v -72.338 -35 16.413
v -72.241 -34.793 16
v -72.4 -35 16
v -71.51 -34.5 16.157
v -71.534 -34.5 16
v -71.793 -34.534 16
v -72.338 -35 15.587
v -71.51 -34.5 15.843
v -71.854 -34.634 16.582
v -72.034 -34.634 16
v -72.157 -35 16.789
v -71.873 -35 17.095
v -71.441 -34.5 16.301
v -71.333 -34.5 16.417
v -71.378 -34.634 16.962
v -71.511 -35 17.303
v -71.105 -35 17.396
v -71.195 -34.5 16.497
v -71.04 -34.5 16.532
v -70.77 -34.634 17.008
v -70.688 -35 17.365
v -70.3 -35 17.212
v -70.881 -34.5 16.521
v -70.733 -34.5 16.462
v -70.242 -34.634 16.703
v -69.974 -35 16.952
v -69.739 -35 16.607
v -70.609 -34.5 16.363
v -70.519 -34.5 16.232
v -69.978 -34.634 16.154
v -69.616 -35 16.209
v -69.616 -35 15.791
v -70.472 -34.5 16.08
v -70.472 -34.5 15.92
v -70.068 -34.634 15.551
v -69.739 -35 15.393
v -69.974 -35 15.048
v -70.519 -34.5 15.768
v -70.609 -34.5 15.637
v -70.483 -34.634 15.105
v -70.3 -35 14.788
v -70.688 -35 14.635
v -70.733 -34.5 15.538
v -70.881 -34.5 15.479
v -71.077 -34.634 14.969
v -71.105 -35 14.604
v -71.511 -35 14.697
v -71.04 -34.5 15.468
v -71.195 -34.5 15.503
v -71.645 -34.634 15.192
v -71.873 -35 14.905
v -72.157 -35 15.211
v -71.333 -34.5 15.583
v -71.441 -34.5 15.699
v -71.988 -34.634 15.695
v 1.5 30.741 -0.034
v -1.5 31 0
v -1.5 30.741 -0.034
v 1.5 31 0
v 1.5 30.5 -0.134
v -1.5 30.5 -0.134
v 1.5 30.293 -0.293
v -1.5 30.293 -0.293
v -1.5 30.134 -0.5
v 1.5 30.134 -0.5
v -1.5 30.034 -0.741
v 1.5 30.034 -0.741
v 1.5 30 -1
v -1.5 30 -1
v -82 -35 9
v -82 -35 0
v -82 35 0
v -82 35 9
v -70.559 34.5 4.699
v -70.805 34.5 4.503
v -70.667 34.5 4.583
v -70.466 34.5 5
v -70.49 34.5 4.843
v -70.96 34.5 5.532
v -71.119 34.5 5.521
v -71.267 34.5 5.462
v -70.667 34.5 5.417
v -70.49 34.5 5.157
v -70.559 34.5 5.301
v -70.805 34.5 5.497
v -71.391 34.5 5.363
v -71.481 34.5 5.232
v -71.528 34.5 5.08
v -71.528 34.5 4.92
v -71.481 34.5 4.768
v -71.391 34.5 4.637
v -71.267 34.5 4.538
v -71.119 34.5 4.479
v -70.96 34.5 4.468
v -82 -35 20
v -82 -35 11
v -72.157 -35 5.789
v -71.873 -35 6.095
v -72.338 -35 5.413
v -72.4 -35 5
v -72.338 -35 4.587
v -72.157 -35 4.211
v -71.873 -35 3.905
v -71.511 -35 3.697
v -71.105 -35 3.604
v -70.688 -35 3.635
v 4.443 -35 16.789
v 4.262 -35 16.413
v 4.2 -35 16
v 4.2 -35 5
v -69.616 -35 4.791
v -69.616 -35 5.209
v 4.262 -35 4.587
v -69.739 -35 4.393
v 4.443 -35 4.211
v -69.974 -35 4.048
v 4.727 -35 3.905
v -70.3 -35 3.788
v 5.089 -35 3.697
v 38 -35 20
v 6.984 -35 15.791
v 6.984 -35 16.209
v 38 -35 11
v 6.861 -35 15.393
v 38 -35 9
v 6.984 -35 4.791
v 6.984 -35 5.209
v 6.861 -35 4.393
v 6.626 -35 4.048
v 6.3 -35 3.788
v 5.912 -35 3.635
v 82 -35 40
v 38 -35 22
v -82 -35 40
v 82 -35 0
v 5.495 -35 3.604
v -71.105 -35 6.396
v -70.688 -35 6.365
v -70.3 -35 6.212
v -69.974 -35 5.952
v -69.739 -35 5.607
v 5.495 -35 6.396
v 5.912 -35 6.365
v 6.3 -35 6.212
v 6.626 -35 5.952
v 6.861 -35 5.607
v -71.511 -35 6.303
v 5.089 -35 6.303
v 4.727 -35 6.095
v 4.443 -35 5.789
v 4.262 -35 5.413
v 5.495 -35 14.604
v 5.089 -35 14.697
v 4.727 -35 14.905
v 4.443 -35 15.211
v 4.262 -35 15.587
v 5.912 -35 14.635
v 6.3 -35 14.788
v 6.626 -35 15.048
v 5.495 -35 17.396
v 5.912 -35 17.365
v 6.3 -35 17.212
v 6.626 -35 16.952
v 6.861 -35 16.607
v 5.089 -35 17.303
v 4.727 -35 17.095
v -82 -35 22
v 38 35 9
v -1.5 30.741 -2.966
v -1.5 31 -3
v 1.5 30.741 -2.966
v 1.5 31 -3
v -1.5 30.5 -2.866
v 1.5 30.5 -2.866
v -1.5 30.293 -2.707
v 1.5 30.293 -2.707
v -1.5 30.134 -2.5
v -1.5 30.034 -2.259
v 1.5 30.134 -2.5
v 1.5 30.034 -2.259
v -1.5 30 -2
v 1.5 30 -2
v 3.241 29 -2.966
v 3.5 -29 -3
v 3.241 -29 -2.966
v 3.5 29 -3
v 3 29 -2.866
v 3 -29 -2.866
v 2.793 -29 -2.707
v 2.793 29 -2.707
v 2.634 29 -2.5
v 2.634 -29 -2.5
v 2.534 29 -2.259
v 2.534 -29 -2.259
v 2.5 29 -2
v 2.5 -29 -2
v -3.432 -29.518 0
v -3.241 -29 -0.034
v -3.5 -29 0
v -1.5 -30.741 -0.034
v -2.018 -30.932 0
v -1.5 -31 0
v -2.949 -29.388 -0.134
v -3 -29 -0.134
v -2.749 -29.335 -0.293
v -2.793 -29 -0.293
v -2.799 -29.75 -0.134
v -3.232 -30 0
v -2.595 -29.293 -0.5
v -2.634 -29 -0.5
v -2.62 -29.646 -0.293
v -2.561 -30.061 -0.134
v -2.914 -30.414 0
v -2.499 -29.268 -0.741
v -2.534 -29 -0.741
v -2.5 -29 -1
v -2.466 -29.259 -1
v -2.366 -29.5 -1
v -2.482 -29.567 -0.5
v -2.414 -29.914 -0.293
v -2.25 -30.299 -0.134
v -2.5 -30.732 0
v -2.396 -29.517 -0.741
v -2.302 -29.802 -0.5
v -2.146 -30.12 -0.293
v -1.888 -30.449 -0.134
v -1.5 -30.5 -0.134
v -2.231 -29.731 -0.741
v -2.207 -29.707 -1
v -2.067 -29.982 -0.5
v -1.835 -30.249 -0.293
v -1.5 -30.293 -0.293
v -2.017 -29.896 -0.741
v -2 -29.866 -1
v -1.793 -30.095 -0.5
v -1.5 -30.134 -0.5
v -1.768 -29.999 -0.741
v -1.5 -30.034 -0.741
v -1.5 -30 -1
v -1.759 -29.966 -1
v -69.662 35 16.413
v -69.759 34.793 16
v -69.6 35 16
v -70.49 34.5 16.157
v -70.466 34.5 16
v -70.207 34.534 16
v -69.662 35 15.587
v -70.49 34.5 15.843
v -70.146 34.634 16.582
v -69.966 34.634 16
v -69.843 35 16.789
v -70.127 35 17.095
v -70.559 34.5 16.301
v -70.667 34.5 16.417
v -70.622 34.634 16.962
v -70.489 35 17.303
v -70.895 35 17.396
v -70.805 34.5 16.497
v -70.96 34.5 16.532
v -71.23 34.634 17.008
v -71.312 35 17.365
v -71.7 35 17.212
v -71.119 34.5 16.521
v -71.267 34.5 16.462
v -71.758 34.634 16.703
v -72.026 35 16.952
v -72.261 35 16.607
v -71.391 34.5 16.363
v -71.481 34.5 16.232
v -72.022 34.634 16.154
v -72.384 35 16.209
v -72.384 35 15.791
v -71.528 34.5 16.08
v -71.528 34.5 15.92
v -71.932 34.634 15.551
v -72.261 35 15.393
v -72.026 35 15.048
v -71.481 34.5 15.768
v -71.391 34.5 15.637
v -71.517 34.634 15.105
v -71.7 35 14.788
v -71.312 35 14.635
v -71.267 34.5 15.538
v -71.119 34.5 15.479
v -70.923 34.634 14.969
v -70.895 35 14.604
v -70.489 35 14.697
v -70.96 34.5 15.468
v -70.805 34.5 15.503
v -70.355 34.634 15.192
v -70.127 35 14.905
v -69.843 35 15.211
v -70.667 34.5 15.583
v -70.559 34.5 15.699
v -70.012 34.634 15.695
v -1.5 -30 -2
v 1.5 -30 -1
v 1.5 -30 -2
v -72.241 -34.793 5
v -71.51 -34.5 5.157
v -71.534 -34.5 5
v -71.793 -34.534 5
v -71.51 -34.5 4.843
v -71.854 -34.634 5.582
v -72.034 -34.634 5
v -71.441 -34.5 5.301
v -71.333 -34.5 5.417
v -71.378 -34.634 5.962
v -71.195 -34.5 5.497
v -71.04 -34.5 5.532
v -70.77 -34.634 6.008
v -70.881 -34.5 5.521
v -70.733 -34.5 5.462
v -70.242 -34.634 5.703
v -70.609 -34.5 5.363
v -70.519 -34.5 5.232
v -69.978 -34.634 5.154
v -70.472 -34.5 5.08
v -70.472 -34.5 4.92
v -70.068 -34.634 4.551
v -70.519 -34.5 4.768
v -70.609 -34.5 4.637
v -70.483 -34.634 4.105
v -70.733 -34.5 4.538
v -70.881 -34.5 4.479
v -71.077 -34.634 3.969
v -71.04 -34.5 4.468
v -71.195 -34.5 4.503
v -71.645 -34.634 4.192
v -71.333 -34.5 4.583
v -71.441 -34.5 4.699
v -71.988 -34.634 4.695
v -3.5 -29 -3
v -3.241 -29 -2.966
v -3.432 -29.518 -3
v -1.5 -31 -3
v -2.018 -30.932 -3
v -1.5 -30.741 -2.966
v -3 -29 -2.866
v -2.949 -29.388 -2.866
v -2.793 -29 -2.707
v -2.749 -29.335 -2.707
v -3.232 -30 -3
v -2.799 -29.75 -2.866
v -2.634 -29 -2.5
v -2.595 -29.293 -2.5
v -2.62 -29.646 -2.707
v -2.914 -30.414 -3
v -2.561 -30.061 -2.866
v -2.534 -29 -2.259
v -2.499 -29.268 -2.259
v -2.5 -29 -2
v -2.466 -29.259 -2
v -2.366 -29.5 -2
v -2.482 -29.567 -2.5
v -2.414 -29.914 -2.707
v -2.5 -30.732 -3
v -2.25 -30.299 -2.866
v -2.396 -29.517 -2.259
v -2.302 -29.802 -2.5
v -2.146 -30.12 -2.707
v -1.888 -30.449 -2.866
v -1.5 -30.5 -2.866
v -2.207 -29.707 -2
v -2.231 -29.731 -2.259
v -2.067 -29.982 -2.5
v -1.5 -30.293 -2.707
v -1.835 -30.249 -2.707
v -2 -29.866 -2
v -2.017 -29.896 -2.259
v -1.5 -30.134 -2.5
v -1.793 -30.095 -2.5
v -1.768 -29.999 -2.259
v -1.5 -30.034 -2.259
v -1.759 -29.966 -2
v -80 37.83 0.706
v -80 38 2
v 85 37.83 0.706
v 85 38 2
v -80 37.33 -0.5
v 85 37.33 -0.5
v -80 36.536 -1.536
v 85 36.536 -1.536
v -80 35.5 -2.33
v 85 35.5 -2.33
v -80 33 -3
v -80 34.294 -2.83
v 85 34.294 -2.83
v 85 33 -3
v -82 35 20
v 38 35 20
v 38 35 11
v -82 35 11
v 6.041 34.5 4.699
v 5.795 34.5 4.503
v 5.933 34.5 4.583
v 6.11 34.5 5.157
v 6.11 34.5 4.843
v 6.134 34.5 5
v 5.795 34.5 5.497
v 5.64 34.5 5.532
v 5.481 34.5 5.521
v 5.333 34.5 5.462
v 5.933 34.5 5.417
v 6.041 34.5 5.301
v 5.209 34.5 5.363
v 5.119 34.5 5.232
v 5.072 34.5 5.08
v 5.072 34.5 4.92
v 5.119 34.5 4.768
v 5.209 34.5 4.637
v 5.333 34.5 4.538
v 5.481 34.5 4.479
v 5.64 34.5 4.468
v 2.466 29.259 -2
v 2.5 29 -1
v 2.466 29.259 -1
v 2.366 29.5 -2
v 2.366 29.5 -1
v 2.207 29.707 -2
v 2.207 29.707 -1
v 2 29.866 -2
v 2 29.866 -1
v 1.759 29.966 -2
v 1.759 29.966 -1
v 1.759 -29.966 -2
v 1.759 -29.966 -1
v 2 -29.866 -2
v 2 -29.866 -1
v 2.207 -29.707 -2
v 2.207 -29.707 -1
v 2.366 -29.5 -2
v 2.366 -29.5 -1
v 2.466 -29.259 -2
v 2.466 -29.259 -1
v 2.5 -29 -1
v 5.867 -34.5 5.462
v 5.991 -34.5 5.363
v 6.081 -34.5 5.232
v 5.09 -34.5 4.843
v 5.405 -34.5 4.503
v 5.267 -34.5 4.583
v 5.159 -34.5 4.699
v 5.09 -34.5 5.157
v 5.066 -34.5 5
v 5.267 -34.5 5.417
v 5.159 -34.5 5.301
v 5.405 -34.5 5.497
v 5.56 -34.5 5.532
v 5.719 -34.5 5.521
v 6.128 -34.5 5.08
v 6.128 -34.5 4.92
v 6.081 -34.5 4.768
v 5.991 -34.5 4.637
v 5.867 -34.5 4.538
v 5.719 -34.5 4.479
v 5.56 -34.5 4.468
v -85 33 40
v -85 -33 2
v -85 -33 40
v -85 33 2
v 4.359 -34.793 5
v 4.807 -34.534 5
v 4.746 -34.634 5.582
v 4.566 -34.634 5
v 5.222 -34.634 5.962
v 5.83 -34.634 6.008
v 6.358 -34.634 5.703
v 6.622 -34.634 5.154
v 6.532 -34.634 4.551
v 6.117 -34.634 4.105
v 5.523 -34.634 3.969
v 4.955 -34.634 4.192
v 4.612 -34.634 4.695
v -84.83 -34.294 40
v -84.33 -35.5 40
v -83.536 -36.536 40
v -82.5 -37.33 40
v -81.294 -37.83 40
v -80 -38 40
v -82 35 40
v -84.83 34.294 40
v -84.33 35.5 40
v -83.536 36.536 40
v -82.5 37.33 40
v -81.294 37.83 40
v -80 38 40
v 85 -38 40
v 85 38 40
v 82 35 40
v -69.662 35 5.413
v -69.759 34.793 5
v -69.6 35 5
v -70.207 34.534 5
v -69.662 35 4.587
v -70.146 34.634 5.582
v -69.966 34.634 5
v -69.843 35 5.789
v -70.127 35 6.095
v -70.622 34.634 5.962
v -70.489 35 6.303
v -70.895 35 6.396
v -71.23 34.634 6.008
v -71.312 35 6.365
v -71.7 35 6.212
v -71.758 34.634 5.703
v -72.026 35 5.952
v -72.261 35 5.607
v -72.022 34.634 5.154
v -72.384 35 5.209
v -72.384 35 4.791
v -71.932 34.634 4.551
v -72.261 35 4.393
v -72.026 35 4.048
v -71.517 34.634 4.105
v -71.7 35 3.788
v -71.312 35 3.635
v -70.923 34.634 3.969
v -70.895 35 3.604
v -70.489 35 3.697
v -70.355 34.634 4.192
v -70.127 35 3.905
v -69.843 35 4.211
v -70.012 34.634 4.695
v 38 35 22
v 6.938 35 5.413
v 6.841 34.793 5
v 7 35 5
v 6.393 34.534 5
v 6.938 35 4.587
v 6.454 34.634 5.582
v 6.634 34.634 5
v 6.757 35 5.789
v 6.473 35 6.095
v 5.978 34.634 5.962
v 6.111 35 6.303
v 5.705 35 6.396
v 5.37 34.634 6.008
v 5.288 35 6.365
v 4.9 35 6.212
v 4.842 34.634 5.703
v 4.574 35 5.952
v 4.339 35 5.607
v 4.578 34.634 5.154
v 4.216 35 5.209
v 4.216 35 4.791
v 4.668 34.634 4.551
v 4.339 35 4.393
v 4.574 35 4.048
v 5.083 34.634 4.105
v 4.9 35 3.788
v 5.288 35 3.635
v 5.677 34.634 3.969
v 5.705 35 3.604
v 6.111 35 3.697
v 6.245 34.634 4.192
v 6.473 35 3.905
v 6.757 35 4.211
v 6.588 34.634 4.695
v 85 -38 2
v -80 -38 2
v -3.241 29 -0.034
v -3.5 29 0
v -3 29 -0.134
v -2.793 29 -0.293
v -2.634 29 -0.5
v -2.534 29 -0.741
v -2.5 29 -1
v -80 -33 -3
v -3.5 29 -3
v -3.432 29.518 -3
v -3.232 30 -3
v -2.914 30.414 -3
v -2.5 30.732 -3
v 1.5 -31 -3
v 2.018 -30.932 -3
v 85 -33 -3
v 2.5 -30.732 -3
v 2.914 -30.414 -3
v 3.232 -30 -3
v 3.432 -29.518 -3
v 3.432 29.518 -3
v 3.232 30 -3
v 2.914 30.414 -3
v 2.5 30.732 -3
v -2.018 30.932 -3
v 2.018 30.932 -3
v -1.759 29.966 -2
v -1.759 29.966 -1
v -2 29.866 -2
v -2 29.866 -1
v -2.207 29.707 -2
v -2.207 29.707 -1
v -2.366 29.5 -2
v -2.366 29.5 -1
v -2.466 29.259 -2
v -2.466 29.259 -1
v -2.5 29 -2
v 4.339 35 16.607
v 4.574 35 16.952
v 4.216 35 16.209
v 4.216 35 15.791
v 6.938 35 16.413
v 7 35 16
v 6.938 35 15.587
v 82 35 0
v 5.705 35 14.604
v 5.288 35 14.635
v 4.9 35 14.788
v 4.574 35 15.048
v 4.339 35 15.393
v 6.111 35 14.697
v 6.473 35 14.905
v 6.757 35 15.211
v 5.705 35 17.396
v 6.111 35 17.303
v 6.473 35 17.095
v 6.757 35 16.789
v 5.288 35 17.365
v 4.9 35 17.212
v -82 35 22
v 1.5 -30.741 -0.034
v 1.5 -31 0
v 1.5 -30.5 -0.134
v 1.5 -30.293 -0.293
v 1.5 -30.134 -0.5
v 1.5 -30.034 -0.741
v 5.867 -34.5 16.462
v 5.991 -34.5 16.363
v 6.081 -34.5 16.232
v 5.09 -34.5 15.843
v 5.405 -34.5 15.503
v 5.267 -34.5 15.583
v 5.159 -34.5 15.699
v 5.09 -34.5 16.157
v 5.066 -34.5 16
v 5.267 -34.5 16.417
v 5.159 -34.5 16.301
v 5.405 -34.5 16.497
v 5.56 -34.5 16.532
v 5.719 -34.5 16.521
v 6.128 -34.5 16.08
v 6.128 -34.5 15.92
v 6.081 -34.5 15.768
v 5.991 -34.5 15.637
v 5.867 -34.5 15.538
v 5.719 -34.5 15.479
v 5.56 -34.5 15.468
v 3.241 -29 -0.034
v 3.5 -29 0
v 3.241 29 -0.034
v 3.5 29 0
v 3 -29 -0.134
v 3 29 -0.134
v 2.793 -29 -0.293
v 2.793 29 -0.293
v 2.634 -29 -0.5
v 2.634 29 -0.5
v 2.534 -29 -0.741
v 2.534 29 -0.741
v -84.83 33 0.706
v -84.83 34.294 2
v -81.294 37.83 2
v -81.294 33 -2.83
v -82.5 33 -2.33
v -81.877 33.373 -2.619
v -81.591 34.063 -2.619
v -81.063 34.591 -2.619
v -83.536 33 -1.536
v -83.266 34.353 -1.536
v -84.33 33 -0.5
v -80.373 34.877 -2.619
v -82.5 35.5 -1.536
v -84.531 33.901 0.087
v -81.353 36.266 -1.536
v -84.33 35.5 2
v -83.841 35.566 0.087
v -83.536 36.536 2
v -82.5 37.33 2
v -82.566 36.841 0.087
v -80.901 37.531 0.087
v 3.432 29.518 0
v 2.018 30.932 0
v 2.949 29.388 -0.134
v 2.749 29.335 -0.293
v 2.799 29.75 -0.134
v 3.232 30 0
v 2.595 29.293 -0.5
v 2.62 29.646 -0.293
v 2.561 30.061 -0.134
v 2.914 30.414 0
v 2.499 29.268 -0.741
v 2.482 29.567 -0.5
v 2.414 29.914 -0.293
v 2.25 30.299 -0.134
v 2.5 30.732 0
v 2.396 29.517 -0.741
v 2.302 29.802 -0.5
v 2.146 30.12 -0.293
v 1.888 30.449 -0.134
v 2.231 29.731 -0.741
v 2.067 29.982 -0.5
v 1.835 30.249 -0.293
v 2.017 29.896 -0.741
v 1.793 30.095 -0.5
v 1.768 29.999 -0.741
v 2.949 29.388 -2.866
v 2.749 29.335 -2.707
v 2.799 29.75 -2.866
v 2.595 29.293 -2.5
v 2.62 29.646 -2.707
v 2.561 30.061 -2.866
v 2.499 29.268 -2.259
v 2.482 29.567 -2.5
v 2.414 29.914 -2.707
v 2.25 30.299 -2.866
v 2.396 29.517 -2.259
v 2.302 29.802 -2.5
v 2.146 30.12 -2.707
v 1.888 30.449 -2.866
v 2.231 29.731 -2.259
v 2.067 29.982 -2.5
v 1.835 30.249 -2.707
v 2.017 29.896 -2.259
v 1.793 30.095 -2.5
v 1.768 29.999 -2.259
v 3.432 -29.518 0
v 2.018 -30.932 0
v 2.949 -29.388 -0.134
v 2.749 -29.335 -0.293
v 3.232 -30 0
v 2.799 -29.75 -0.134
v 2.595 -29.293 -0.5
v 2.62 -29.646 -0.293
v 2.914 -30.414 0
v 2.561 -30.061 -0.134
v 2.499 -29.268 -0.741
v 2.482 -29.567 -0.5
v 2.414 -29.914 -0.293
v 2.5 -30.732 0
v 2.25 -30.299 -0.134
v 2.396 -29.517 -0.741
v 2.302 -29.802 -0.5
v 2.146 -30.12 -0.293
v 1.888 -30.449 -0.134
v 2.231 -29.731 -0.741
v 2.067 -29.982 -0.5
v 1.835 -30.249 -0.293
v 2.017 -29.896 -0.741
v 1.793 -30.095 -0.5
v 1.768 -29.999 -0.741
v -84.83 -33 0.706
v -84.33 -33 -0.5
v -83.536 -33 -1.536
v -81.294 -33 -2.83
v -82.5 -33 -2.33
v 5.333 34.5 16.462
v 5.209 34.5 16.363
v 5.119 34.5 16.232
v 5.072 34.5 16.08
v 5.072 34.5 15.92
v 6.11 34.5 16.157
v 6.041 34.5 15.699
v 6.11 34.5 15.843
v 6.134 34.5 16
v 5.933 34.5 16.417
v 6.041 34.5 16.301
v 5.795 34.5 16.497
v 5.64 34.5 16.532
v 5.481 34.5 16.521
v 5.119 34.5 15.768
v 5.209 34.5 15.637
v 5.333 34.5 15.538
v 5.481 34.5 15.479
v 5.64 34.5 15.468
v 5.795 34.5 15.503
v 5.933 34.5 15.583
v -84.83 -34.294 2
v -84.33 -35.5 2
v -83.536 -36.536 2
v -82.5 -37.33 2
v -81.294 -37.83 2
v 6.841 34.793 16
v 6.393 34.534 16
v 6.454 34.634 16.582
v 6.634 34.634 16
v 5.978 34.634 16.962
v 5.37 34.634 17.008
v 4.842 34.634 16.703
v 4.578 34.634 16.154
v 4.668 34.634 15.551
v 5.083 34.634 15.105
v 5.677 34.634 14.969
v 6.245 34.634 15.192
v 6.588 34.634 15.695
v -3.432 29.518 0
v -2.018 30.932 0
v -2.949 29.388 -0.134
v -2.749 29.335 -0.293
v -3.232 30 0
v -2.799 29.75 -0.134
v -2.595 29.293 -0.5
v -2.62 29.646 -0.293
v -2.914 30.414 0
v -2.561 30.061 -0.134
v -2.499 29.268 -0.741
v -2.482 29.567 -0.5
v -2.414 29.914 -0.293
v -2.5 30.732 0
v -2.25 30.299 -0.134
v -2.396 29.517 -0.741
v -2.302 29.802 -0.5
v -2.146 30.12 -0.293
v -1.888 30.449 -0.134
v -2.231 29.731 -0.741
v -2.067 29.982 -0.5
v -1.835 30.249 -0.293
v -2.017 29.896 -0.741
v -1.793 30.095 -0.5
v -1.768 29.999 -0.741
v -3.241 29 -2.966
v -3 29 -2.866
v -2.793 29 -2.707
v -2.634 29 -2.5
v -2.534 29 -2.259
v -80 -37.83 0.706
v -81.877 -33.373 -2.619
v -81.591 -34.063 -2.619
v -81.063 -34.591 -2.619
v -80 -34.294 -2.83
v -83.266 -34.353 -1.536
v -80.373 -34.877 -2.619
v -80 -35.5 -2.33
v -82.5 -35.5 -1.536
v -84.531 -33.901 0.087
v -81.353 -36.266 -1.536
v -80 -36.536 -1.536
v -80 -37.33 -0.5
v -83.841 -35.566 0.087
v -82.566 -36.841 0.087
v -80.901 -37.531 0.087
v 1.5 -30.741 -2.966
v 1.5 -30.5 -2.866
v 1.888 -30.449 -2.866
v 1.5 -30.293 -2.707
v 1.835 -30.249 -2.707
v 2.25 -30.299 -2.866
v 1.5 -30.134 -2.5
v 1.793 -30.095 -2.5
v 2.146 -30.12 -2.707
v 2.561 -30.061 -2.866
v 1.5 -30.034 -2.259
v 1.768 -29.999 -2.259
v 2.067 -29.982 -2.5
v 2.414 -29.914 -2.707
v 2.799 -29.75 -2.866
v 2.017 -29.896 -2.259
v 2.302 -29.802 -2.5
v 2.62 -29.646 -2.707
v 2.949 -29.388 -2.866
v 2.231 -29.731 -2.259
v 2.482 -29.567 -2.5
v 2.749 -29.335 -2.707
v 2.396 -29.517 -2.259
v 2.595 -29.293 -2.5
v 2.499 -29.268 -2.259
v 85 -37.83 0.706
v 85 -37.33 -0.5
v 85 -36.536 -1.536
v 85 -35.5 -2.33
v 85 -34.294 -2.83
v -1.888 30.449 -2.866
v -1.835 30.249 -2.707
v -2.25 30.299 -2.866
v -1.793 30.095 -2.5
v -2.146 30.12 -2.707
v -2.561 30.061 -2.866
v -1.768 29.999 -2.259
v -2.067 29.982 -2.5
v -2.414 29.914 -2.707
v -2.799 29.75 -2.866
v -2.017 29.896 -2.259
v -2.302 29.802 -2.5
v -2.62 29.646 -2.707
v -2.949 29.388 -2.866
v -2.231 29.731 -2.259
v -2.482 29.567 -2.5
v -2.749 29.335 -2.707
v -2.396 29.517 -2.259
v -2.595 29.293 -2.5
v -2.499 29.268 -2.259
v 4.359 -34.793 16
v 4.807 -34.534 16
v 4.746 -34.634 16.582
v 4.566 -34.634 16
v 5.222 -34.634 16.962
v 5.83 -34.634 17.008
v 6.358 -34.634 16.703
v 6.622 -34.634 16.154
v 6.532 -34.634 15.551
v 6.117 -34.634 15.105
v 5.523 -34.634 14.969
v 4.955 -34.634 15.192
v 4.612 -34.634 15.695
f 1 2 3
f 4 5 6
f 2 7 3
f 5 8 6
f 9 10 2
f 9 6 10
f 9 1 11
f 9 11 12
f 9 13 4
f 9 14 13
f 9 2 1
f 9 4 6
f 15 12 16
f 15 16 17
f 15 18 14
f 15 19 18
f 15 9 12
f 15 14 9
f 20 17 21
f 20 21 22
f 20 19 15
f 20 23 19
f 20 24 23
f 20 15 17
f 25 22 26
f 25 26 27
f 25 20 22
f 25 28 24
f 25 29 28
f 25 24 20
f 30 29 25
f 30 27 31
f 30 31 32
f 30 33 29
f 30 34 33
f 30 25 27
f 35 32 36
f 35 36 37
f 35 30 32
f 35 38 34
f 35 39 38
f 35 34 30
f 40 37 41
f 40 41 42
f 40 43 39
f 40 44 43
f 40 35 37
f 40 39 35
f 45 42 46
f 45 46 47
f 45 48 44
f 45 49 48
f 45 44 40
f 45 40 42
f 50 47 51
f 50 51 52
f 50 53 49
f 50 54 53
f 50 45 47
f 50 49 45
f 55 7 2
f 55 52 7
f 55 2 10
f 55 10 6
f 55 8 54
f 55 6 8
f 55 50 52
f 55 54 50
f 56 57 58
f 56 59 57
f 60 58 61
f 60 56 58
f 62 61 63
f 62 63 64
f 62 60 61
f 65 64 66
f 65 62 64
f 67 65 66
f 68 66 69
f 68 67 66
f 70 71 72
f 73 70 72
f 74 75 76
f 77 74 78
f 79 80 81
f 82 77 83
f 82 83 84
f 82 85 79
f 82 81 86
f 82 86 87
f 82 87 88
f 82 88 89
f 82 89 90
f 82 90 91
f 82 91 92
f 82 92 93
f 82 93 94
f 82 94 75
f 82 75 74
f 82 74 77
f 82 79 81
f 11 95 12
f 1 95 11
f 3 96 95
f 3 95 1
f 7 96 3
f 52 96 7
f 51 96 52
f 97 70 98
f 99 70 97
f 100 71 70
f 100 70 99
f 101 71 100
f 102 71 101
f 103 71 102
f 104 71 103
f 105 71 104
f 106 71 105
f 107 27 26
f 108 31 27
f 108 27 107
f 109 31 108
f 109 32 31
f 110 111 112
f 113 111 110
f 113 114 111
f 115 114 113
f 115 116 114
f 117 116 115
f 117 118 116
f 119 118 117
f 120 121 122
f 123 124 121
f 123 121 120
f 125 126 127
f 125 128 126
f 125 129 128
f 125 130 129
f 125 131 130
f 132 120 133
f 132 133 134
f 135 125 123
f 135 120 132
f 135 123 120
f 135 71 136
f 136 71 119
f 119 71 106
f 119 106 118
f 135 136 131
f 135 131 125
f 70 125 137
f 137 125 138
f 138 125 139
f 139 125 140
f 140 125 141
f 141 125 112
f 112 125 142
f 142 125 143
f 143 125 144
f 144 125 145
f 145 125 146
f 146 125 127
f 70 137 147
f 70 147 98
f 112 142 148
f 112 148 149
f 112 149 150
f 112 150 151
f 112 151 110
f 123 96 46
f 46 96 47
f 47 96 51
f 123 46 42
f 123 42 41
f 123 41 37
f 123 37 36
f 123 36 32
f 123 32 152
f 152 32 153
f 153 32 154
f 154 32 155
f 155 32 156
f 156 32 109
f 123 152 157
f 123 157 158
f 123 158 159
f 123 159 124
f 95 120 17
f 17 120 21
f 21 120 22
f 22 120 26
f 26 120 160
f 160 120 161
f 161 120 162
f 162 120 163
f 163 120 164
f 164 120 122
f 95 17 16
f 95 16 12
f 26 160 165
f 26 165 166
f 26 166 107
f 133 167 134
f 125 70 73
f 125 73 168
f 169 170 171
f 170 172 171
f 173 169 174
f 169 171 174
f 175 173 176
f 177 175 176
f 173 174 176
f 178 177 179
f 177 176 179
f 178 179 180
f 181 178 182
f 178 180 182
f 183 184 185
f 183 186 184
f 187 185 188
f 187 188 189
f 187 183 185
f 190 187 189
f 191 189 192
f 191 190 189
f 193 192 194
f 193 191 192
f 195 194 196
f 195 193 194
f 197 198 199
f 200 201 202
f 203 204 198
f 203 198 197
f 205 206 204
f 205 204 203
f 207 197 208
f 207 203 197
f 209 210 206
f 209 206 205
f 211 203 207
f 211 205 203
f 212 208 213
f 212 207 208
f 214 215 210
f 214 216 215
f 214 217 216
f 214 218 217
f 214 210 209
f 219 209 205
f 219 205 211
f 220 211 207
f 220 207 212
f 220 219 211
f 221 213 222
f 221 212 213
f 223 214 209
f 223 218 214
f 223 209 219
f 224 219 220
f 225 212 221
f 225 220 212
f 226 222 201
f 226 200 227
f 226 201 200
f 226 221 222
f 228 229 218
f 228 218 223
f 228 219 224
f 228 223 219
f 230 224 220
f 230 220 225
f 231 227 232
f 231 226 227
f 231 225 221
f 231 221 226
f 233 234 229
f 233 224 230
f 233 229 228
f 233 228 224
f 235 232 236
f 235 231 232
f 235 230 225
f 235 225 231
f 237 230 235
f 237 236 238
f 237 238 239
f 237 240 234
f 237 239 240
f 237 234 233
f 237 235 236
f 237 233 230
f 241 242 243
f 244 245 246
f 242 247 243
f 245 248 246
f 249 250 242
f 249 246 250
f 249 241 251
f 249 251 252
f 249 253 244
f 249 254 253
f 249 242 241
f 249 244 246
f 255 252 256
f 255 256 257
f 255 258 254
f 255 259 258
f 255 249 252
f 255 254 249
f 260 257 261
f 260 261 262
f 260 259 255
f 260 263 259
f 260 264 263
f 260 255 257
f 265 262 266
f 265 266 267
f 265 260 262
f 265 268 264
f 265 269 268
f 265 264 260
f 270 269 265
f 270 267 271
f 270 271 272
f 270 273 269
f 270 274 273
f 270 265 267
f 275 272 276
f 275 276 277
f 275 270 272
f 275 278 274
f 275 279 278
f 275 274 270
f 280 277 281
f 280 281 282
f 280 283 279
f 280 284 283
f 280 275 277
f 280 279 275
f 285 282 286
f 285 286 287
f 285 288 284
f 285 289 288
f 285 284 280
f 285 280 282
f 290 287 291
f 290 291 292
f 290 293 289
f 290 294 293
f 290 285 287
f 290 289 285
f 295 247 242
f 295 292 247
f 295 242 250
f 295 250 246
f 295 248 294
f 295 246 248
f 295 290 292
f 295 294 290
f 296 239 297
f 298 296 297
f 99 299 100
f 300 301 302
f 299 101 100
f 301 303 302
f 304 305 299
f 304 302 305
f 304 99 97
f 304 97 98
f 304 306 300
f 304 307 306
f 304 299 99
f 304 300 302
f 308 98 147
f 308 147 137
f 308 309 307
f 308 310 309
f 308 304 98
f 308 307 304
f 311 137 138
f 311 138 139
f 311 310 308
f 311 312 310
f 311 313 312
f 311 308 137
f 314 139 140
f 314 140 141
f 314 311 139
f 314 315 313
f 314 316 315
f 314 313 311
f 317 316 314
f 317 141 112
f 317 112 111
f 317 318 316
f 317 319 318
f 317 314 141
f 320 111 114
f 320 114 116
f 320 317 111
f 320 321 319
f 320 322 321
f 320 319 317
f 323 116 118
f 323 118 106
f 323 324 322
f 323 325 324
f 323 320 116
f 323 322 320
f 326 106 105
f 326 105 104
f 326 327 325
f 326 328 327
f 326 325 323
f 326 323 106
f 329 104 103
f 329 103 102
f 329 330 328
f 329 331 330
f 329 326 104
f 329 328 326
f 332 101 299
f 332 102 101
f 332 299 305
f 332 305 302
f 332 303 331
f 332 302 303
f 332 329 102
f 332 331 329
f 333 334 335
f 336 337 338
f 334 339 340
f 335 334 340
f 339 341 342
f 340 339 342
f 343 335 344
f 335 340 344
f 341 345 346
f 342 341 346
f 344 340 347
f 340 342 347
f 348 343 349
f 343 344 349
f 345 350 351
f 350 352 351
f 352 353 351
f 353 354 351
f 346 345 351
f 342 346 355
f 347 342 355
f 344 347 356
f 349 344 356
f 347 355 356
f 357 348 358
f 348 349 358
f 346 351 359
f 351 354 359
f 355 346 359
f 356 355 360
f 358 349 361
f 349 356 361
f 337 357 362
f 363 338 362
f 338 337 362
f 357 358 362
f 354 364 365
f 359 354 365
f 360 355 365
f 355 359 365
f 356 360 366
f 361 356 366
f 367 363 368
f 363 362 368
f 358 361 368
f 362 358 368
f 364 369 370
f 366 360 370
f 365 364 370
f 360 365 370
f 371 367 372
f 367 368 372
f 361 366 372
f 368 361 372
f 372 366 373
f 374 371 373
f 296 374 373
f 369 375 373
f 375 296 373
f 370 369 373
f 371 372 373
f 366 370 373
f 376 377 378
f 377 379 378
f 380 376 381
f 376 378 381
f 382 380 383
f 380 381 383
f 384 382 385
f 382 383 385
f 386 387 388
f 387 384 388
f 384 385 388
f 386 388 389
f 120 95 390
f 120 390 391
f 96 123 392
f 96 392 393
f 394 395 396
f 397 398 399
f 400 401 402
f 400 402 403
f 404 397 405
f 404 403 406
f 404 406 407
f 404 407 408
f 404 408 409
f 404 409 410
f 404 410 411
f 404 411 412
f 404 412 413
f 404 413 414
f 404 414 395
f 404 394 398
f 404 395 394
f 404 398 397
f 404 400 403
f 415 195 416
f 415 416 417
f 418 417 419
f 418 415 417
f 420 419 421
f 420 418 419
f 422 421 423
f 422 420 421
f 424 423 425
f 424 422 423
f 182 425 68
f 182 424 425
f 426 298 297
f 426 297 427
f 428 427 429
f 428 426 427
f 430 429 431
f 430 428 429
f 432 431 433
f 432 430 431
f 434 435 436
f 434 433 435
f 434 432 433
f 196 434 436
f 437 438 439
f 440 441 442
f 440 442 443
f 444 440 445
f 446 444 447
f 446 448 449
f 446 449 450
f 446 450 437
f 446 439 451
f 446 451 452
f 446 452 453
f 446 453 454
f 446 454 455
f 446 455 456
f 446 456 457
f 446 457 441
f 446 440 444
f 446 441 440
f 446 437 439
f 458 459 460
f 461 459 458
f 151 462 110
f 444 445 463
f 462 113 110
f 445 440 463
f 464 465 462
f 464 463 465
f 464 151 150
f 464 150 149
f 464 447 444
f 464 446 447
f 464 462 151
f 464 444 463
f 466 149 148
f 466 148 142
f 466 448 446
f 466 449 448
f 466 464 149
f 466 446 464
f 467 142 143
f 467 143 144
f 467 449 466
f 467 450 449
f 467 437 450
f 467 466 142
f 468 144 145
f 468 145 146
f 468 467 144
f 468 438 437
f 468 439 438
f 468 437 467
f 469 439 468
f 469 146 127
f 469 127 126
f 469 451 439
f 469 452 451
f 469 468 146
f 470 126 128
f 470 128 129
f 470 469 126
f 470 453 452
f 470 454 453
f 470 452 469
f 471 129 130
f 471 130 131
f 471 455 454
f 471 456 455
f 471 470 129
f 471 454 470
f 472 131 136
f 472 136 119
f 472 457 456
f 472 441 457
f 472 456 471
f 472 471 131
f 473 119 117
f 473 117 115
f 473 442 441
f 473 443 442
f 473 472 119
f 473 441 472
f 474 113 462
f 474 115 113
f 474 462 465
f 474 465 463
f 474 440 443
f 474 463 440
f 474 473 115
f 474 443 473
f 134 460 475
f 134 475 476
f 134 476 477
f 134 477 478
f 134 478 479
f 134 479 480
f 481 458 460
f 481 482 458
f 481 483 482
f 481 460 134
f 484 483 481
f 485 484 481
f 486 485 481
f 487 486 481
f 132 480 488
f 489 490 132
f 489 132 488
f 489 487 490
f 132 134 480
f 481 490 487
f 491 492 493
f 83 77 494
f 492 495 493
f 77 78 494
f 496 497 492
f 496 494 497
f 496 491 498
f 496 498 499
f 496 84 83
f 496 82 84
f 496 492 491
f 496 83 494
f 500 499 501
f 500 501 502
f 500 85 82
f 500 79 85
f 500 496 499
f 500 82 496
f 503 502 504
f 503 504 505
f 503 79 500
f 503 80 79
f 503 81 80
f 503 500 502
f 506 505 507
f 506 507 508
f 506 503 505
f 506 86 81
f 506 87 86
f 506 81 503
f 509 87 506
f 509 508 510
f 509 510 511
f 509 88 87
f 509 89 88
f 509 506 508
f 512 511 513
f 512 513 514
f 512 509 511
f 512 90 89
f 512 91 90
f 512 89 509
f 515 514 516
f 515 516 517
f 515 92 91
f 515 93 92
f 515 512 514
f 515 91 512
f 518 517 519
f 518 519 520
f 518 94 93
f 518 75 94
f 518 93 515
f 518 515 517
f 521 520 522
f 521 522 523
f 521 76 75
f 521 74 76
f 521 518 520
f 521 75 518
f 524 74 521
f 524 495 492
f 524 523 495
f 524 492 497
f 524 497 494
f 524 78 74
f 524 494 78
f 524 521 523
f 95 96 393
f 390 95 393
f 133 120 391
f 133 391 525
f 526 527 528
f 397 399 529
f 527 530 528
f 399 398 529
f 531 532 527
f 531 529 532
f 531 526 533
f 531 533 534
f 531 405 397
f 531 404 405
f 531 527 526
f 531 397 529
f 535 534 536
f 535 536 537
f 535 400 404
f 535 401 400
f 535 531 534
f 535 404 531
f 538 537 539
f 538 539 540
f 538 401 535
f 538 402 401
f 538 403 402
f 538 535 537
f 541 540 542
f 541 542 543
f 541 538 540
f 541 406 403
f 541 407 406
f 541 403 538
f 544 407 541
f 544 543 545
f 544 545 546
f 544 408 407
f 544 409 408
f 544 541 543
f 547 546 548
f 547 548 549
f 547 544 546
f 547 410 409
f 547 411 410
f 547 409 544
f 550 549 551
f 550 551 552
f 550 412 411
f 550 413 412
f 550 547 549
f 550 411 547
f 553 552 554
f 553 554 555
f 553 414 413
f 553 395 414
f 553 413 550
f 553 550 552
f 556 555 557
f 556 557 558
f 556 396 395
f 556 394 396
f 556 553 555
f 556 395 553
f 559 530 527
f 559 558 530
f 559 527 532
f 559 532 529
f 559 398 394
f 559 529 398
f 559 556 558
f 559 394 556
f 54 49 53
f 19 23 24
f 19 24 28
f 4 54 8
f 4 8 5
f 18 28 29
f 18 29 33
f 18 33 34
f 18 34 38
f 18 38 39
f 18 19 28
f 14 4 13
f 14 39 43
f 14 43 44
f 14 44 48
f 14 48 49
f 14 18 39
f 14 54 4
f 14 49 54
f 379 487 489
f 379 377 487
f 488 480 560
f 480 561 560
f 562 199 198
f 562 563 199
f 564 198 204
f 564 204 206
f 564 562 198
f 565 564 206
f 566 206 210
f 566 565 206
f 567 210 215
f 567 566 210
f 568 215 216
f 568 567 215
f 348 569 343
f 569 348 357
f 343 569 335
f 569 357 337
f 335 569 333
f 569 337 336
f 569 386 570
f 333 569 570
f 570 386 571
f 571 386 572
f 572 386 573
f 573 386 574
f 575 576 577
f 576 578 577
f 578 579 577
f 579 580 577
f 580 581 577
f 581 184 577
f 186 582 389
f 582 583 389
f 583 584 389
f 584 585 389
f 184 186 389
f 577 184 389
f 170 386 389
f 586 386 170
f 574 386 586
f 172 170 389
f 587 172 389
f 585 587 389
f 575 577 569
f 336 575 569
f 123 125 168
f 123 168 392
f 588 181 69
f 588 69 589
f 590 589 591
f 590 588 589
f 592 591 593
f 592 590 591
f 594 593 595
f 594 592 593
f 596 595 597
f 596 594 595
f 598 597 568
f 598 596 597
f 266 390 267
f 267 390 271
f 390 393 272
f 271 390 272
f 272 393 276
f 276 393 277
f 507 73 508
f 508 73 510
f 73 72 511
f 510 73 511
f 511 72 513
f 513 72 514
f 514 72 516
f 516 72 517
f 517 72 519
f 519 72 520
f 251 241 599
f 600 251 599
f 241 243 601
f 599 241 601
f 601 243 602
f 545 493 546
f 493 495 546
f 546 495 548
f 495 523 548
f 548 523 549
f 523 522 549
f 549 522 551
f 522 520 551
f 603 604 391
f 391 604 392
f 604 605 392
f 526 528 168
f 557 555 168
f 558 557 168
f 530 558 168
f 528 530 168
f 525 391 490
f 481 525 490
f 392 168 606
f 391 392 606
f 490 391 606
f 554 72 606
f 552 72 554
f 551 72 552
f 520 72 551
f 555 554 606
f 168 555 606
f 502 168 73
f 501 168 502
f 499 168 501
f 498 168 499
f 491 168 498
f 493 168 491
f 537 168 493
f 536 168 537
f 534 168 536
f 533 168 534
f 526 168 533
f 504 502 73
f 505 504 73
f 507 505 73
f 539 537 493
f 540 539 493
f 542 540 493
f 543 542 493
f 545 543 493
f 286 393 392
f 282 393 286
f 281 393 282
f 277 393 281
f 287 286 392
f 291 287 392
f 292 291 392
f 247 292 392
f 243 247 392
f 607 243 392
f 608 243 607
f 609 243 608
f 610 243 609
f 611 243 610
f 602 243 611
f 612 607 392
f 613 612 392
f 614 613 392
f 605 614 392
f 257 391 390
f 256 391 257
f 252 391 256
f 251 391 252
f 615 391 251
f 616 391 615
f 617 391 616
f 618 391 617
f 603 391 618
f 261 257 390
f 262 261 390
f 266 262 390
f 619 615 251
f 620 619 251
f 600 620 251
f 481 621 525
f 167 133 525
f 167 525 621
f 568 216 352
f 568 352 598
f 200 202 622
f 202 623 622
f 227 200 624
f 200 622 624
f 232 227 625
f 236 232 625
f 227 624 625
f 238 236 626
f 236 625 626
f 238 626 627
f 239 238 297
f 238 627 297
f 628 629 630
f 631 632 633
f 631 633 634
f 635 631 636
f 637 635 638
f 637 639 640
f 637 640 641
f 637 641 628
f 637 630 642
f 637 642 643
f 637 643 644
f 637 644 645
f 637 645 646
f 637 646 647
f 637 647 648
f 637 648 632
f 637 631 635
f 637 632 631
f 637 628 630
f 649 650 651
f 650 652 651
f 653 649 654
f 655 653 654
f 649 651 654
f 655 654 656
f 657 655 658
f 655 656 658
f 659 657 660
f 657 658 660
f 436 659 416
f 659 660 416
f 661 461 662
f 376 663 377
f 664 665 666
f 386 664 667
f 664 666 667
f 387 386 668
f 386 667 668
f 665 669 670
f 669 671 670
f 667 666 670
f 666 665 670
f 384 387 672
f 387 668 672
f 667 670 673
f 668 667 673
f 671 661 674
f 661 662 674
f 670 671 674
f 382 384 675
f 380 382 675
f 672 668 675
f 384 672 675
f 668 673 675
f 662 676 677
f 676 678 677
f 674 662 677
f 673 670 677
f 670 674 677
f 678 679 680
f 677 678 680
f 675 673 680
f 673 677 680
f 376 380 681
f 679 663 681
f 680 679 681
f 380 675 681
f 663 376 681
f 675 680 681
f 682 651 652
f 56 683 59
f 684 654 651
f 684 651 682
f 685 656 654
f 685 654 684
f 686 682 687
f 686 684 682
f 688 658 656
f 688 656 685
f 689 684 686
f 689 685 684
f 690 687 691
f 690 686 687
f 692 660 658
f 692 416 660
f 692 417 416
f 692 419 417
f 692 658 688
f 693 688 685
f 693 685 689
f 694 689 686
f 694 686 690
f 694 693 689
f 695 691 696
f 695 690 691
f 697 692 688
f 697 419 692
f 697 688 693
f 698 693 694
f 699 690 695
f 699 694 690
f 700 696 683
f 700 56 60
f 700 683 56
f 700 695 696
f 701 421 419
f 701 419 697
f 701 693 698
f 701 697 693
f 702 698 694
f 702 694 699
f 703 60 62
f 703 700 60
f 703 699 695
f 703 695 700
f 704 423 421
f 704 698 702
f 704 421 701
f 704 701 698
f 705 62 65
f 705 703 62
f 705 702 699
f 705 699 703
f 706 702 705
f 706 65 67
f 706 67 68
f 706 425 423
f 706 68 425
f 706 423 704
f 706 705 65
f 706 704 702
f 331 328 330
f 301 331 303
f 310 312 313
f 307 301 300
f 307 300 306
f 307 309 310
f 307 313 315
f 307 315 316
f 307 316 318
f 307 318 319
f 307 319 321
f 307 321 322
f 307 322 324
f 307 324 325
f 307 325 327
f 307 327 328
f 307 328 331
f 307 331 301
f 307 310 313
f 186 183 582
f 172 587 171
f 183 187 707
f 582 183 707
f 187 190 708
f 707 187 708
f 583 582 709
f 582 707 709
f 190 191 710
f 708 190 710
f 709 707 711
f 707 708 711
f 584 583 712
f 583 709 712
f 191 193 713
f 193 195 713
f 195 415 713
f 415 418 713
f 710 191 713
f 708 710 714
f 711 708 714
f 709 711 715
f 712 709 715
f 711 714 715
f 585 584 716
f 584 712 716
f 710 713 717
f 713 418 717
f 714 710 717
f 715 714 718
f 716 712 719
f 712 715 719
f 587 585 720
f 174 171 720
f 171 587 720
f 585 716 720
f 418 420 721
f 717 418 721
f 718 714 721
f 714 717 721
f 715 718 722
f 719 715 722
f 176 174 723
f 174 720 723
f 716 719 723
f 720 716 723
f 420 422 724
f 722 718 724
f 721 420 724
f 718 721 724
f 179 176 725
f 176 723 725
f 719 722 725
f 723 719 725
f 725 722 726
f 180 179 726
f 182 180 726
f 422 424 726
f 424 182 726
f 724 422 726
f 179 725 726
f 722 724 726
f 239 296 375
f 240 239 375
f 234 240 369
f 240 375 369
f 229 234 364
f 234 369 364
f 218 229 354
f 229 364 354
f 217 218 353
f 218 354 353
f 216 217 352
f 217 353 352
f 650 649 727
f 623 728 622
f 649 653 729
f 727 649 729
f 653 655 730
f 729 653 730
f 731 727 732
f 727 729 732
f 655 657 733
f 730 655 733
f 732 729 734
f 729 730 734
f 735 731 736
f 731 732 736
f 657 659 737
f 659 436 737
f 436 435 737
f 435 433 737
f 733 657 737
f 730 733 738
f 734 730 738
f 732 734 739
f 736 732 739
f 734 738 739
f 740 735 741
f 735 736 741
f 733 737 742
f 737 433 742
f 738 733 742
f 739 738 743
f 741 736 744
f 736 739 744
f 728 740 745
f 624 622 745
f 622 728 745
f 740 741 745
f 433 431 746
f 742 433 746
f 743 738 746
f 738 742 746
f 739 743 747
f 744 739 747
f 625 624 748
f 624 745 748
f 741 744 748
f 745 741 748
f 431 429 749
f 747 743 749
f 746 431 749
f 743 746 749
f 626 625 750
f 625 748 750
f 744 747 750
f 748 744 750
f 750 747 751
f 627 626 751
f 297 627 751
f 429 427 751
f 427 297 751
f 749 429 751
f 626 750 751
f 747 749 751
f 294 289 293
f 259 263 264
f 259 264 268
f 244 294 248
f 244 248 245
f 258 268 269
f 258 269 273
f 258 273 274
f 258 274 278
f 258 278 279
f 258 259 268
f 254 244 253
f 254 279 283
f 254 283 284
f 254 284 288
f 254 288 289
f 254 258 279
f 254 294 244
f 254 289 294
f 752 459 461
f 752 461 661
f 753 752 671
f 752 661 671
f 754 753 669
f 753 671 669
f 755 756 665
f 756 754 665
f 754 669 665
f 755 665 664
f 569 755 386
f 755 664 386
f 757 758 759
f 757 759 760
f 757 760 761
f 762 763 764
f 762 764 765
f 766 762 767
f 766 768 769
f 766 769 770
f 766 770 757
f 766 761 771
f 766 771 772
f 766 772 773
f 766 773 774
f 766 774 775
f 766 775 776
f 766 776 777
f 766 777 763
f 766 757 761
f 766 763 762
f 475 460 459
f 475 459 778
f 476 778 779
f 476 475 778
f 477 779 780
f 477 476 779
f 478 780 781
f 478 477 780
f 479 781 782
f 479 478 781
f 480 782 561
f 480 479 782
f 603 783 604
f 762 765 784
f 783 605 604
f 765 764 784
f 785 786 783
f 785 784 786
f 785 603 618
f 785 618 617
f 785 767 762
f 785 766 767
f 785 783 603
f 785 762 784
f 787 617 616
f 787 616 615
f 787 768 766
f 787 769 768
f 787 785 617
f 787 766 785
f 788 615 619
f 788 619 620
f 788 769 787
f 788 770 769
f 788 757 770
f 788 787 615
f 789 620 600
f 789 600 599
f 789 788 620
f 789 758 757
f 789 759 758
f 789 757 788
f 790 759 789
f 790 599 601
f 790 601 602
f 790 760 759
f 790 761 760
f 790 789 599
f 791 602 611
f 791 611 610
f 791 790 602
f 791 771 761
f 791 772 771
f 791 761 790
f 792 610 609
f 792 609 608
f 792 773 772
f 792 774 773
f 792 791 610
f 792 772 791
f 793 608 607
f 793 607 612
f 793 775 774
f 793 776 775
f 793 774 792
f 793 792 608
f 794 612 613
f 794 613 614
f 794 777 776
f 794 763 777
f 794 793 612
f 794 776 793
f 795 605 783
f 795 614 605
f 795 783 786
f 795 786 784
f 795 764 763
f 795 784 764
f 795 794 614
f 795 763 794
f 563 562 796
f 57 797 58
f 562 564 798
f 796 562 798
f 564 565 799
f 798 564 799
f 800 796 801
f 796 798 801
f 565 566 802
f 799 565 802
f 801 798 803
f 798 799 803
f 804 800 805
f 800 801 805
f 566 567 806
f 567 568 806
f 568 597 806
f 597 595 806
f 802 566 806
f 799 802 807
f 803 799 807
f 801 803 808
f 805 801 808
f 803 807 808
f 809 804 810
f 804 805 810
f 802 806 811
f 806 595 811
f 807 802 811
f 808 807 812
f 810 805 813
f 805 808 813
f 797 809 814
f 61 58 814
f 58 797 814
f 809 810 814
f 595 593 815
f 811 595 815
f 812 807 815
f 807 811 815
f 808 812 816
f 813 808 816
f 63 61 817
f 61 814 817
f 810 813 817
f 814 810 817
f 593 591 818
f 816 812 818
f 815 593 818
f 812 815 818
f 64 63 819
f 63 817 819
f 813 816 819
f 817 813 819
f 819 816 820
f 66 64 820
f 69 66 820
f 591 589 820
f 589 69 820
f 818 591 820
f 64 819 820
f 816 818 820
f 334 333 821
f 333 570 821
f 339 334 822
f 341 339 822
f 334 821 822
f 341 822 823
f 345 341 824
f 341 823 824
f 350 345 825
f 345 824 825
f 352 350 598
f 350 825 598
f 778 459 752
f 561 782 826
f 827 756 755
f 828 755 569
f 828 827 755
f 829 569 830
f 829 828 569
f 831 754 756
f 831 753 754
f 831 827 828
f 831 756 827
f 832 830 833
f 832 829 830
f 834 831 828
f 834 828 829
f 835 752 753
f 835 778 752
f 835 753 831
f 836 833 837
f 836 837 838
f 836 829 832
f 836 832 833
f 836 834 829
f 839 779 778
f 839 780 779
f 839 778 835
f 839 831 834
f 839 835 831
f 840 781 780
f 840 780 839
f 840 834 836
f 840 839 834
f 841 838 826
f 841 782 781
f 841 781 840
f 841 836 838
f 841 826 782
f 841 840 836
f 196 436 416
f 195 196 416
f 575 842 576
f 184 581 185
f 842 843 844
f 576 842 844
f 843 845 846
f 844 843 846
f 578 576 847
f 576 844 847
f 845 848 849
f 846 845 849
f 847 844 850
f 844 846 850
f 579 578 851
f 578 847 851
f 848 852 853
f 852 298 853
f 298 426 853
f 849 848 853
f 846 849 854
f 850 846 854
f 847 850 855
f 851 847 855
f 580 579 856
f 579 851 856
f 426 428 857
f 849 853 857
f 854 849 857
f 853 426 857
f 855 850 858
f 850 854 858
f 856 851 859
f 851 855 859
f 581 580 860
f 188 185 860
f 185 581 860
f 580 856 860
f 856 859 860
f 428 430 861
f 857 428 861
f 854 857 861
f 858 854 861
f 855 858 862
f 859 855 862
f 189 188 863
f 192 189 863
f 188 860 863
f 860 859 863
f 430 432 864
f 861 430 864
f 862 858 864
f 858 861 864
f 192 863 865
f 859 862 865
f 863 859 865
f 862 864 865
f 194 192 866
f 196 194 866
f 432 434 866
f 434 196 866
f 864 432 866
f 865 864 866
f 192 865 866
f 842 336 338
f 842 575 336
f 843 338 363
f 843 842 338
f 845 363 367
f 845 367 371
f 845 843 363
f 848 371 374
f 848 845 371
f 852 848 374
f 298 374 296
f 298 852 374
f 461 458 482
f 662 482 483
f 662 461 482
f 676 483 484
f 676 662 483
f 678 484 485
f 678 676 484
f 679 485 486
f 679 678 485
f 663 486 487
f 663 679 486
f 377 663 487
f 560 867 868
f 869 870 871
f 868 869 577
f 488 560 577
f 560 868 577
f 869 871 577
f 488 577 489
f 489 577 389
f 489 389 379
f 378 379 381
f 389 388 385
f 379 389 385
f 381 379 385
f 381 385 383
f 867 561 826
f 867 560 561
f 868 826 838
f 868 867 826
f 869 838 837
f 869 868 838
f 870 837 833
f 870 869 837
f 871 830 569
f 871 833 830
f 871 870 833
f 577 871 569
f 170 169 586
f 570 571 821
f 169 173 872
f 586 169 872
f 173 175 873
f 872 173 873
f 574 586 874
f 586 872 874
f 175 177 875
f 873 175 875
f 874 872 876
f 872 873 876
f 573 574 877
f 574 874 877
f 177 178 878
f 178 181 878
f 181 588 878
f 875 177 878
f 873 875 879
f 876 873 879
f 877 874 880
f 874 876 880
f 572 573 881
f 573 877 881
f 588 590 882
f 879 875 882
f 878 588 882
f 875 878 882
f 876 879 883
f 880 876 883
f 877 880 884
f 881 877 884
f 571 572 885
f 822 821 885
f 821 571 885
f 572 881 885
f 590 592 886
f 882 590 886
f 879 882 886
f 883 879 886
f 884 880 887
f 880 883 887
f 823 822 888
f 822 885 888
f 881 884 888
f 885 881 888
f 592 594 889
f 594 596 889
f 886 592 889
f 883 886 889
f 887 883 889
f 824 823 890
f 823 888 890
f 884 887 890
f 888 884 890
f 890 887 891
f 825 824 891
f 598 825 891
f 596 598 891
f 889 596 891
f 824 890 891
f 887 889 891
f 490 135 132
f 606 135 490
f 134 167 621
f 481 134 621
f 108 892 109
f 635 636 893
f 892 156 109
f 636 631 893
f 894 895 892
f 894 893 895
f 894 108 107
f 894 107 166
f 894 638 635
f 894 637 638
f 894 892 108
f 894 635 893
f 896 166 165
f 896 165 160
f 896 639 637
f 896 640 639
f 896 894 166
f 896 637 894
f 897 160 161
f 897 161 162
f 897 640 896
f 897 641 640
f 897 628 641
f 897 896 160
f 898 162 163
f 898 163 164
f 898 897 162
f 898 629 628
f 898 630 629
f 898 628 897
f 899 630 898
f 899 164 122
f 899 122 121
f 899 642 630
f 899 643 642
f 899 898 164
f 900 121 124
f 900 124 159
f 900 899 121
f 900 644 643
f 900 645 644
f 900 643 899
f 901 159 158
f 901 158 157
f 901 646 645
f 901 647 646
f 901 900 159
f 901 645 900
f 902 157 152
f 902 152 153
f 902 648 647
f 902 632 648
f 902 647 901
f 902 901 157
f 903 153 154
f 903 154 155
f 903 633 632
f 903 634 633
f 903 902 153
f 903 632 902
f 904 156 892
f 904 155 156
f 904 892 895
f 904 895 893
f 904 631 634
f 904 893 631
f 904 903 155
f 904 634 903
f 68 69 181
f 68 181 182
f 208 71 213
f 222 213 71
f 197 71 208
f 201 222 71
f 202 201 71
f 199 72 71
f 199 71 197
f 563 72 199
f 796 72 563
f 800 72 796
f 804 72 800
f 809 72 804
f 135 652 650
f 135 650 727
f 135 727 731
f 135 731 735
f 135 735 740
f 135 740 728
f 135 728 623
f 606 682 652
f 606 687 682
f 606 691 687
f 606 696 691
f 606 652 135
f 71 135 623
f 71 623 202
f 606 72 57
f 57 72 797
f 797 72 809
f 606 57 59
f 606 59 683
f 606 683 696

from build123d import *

# Parameters (mm, degrees)
F0_W      = 170
F0_H      = 76
F0_W_2    = 164
F0_H_2    = 70
F1_DEPTH  = 3
F2_DEPTH  = 40
F4_DEPTH  = 35.9
F5_DEPTH  = 36.4
F6_R      = 1.4
F7_DEPTH  = 0.5
F9_R      = 1.4
F10_DEPTH = 0.5
F12_R     = 5
F13_W     = 5
F13_H     = 60
F14_DEPTH = 5
F15_R     = 1


# Not quite as in the source:
# - a fillet or chamfer that OpenCascade refuses, or shapes differently, is made with other operations: its cross-section is extruded or revolved along the edge and cut away or added


with BuildPart() as f1:
    # F0 (on Top) → F1 (new body)
    with BuildSketch(Plane.XY):
        Rectangle(F0_W, F0_H)
        Rectangle(F0_W_2, F0_H_2, mode=Mode.SUBTRACT)
        Rectangle(F0_W_2, F0_H_2)
    extrude(amount=-F1_DEPTH)

    # F0 (on Top) → F2 (join)
    with BuildSketch(Plane.XY):
        Rectangle(F0_W, F0_H)
        Rectangle(F0_W_2, F0_H_2, mode=Mode.SUBTRACT)
    extrude(amount=F2_DEPTH)

    # F3 (on Front) → F4 (join, symmetric)
    with BuildSketch(Plane.XZ):
        Polygon((-82, 11), (-82, 9), (-71, 9), (0, 9), (5.6, 9), (38, 9), (38, 11), align=None)
    extrude(amount=F4_DEPTH, both=True)

    # F3 (on Front) → F5 (join, symmetric)
    with BuildSketch(Plane.XZ):
        Polygon((-82, 22), (-82, 20), (-71, 20), (5.6, 20), (38, 20), (38, 22), align=None)
    extrude(amount=F5_DEPTH, both=True)

    # F6 (on face) → F7 (join)
    with BuildSketch(Plane.XZ.offset(-35)):
        with Locations((-71, 16)):
            Circle(F6_R)
        with Locations((-71, 5)):
            Circle(F6_R)
        with Locations((5.6, 5)):
            Circle(F6_R)
        with Locations((5.6, 16)):
            Circle(F6_R)
    extrude(amount=F7_DEPTH)

    # F8: fillet of radius 1 on 4 edges, made by hand

    # F8_s1 → F8_t2 (revolve, cut)
    with BuildSketch(Plane.XY.offset(16)):
        with BuildLine():
            ThreePointArc((-69.6, 35), (-69.9660254038, 34.6339745962), (-70.4660254038, 34.5))
            Line((-70.4660254038, 34.5), (-69.6, 34.5))
            Line((-69.6, 34.5), (-69.6, 35))
        make_face()
    revolve(axis=Axis((-71, 34.5, 16), (0, -1, 0)), mode=Mode.SUBTRACT)

    # F8_s3 → F8_t4 (revolve, cut)
    with BuildSketch(Plane.XY.offset(5)):
        with BuildLine():
            ThreePointArc((-69.6, 35), (-69.9660254038, 34.6339745962), (-70.4660254038, 34.5))
            Line((-70.4660254038, 34.5), (-69.6, 34.5))
            Line((-69.6, 34.5), (-69.6, 35))
        make_face()
    revolve(axis=Axis((-71, 34.5, 5), (0, -1, 0)), mode=Mode.SUBTRACT)

    # F8_s5 → F8_t6 (revolve, cut)
    with BuildSketch(Plane.XY.offset(16)):
        with BuildLine():
            ThreePointArc((7, 35), (6.6339745962, 34.6339745962), (6.1339745962, 34.5))
            Line((6.1339745962, 34.5), (7, 34.5))
            Line((7, 34.5), (7, 35))
        make_face()
    revolve(axis=Axis((5.6, 34.5, 16), (0, -1, 0)), mode=Mode.SUBTRACT)

    # F8_s7 → F8_t8 (revolve, cut)
    with BuildSketch(Plane.XY.offset(5)):
        with BuildLine():
            ThreePointArc((7, 35), (6.6339745962, 34.6339745962), (6.1339745962, 34.5))
            Line((6.1339745962, 34.5), (7, 34.5))
            Line((7, 34.5), (7, 35))
        make_face()
    revolve(axis=Axis((5.6, 34.5, 5), (0, -1, 0)), mode=Mode.SUBTRACT)

    # F9 (on face) → F10 (join)
    with BuildSketch(Plane(origin=(0, -35, 0), x_dir=(-1, 0, 0), z_dir=(0, 1, 0))):
        with Locations((71, 16)):
            Circle(F9_R)
        with Locations((-5.6, 16)):
            Circle(F9_R)
        with Locations((-5.6, 5)):
            Circle(F9_R)
        with Locations((71, 5)):
            Circle(F9_R)
    extrude(amount=F10_DEPTH)

    # F11: fillet of radius 1 on 4 edges, made by hand

    # F11_s1 → F11_t2 (revolve, cut)
    with BuildSketch(Plane.XY.offset(16)):
        with BuildLine():
            ThreePointArc((-72.4, -35), (-72.0339745962, -34.6339745962), (-71.5339745962, -34.5))
            Line((-71.5339745962, -34.5), (-72.4, -34.5))
            Line((-72.4, -34.5), (-72.4, -35))
        make_face()
    revolve(axis=Axis((-71, -34.5, 16), (0, 1, 0)), mode=Mode.SUBTRACT)

    # F11_s3 → F11_t4 (revolve, cut)
    with BuildSketch(Plane.XY.offset(5)):
        with BuildLine():
            ThreePointArc((-72.4, -35), (-72.0339745962, -34.6339745962), (-71.5339745962, -34.5))
            Line((-71.5339745962, -34.5), (-72.4, -34.5))
            Line((-72.4, -34.5), (-72.4, -35))
        make_face()
    revolve(axis=Axis((-71, -34.5, 5), (0, 1, 0)), mode=Mode.SUBTRACT)

    # F11_s5 → F11_t6 (revolve, cut)
    with BuildSketch(Plane.XY.offset(16)):
        with BuildLine():
            ThreePointArc((4.2, -35), (4.5660254038, -34.6339745962), (5.0660254038, -34.5))
            Line((5.0660254038, -34.5), (4.2, -34.5))
            Line((4.2, -34.5), (4.2, -35))
        make_face()
    revolve(axis=Axis((5.6, -34.5, 16), (0, 1, 0)), mode=Mode.SUBTRACT)

    # F11_s7 → F11_t8 (revolve, cut)
    with BuildSketch(Plane.XY.offset(5)):
        with BuildLine():
            ThreePointArc((4.2, -35), (4.5660254038, -34.6339745962), (5.0660254038, -34.5))
            Line((5.0660254038, -34.5), (4.2, -34.5))
            Line((4.2, -34.5), (4.2, -35))
        make_face()
    revolve(axis=Axis((5.6, -34.5, 5), (0, 1, 0)), mode=Mode.SUBTRACT)

    # F12
    f12_edges = [f1.edges().sort_by_distance(p)[0] for p in [
        (-85, 38, 18.5),
        (-85, -38, 18.5),
        (-85, 0, -3),
        (0, 38, -3),
        (0, -38, -3),
    ]]
    fillet(f12_edges, radius=F12_R)

    # F13 (on face) → F14 (cut)
    with BuildSketch(Plane.XY):
        Rectangle(F13_W, F13_H)
    extrude(amount=-F14_DEPTH, mode=Mode.SUBTRACT)

    # F15
    f15_edges = [f1.edges().sort_by_distance(p)[0] for p in [
        (0, 30, 0),
        (-2.5, 30, -1.5),
        (0, 30, -3),
        (2.5, 30, -1.5),
        (0, -30, 0),
        (2.5, -30, -1.5),
        (0, -30, -3),
        (-2.5, -30, -1.5),
        (-2.5, 0, -3),
        (2.5, 0, -3),
        (-2.5, 0, 0),
        (2.5, 0, 0),
    ]]
    fillet(f15_edges, radius=F15_R)


solid = f1.part
